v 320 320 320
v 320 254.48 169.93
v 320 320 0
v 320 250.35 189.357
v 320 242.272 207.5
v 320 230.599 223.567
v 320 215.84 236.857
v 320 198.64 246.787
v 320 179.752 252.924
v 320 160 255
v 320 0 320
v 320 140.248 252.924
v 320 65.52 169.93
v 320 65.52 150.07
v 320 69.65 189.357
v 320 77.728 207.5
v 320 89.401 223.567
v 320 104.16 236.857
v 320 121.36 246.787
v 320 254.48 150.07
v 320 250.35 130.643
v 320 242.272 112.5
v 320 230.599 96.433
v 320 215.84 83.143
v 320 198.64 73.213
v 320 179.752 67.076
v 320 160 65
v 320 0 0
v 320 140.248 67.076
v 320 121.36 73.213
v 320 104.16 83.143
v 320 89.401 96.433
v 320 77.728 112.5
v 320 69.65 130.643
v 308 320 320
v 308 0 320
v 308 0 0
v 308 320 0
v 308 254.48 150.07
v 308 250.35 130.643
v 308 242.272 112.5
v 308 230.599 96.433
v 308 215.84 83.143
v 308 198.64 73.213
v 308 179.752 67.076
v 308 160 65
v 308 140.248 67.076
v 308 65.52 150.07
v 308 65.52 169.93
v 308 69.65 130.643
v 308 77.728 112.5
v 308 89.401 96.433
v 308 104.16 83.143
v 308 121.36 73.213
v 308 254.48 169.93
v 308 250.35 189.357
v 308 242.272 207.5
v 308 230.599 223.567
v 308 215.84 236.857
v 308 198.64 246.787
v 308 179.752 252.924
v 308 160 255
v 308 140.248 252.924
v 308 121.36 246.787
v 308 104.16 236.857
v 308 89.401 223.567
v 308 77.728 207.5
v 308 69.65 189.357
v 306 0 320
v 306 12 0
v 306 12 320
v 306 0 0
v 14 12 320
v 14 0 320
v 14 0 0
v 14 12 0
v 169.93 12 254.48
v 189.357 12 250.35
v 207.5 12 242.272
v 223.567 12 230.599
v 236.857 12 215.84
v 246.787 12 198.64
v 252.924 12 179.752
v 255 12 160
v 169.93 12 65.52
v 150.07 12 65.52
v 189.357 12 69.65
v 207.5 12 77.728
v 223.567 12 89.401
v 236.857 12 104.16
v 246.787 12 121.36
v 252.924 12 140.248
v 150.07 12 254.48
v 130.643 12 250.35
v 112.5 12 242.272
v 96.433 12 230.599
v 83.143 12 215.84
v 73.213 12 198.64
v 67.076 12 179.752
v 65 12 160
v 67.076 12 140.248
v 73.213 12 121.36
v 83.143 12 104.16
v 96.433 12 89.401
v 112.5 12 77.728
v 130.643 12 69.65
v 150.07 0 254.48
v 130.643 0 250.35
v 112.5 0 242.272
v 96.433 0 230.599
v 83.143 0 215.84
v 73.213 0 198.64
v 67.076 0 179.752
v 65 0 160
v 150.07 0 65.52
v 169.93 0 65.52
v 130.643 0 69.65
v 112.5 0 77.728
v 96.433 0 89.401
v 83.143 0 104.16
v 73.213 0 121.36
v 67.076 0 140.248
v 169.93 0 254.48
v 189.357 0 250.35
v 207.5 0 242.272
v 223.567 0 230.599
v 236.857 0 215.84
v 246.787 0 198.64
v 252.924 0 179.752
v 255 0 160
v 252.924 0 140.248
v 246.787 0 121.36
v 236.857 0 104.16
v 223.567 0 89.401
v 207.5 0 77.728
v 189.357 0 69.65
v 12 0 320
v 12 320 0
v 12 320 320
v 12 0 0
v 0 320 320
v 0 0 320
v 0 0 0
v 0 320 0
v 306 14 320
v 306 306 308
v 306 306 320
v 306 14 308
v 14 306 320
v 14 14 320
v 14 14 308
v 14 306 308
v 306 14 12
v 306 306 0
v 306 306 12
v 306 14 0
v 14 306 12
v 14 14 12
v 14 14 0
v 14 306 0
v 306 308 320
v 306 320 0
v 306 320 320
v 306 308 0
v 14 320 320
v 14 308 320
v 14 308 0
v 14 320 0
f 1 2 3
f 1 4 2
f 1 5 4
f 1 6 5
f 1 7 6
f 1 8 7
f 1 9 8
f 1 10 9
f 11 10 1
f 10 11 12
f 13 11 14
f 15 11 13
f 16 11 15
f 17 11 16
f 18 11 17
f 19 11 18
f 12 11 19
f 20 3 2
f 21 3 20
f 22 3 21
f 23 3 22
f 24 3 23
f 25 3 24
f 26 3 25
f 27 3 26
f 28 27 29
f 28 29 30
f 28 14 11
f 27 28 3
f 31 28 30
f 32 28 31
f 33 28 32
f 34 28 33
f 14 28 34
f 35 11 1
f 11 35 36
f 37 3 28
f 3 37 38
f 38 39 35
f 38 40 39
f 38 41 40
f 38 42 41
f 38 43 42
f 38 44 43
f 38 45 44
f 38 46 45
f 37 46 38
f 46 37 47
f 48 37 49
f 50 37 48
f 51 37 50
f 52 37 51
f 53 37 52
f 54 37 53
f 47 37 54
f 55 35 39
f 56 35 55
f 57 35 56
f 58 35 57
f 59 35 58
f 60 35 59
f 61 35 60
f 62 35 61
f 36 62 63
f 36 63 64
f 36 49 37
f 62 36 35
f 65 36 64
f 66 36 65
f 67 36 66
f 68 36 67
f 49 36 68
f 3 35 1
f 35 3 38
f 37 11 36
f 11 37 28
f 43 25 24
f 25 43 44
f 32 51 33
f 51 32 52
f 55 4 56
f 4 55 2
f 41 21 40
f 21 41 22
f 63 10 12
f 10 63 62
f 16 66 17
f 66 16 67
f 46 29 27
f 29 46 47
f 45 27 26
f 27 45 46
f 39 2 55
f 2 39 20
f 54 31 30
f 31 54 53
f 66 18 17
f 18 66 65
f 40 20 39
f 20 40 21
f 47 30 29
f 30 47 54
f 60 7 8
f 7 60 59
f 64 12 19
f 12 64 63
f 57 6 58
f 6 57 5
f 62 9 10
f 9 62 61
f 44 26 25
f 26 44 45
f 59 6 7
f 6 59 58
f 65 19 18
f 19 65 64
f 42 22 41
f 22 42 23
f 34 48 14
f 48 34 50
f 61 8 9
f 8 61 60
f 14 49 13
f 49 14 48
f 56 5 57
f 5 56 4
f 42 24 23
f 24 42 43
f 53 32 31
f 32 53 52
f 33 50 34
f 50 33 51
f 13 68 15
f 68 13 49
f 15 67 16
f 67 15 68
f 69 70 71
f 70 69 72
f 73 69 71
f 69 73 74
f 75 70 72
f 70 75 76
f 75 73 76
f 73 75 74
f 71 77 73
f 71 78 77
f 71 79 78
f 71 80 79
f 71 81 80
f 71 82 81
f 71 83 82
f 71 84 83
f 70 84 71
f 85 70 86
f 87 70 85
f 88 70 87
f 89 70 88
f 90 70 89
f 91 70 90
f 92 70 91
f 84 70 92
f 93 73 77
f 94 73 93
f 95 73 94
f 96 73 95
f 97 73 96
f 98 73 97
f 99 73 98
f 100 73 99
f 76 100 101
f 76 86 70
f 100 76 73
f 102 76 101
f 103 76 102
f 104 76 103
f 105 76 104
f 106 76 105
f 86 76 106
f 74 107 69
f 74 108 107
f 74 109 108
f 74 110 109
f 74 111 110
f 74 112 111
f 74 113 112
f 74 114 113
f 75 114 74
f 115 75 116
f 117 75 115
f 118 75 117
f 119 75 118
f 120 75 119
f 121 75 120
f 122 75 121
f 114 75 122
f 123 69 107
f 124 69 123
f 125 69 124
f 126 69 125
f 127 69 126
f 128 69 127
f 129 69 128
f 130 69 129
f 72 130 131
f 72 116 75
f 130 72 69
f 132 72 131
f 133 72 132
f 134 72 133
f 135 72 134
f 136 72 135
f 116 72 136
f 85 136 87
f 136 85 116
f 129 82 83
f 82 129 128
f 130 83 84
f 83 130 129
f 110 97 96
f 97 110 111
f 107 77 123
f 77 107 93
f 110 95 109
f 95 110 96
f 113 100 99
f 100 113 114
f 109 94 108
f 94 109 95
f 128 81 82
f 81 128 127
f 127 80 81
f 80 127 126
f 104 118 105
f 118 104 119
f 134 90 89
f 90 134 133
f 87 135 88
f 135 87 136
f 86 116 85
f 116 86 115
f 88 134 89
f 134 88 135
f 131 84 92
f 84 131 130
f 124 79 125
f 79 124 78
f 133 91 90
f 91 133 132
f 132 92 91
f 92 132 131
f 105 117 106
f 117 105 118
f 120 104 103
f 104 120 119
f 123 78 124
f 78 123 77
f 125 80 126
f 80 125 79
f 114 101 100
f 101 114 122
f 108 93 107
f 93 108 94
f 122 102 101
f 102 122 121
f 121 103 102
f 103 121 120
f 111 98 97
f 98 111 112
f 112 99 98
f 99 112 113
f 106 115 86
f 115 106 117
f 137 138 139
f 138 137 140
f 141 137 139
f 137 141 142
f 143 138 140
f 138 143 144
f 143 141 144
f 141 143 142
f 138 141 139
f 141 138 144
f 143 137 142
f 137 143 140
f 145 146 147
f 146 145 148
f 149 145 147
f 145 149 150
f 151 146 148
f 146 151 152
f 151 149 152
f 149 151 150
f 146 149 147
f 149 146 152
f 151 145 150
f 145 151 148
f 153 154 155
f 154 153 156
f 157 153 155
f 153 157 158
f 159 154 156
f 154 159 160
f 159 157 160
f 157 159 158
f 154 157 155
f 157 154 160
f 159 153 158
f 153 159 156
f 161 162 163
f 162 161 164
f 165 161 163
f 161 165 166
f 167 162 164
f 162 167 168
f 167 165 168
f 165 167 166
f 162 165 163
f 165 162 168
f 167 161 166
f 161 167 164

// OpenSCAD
/*

Cat climbing wall
@idnorton
2020-08-30

Licenced as Creative Commons Attribution Non Commercial 3.0
See https://creativecommons.org/licenses/by-nc/3.0/

Specifically you may not sell the design or products using the design.
You're welcome to use the design to build these your own cats :)

*/

// Overall size
x_size = 320;
y_size = 320;
thickness = 12;

hole = 190;
kerf = 2;

// Sides - left
side(x_size, y_size, thickness);

// Sides - right
difference() {
    translate([x_size - thickness, 0, 0]) { side(x_size, y_size, thickness); };
    translate([x_size - thickness, y_size/2, y_size/2]) {
       rotate(a=[0,90,0]) { cylinder(h = thickness * 3, d1 = hole, d2 = hole, center = true); }
    };
}

// top & bottom
translate([0, 0, x_size-thickness]) {top_bottom(x_size, y_size, thickness);};
translate([0, 0, 0]) {top_bottom(x_size, y_size, thickness);};

// Front
difference() {
    translate([0, 0, 0]) {front_back(x_size, y_size, thickness);};
    translate([x_size/2, 0, y_size/2]) {
       rotate(a=[90,0,0]) { cylinder(h = thickness * 3, d1 = hole, d2 = hole, center = true); }
    };
}

// Back
translate([0, x_size - thickness, 0]) {front_back(x_size, y_size, thickness);};

 module side (x, y, thickness) {
    cube(size = [thickness, y, x]);
 }

 module front_back (x, y, thickness) {
     translate([thickness + kerf, 0, 0]) {
         cube(size = [x - (2*thickness) - (2*kerf), thickness, y]);
     }
 }

 module top_bottom (x, y, thickness) {
     translate([thickness + kerf, thickness + kerf, 0]) {
         cube(size = [y - (2*thickness) - (2*kerf), x - (2*thickness) - (2*kerf), thickness]);
     }
 }
